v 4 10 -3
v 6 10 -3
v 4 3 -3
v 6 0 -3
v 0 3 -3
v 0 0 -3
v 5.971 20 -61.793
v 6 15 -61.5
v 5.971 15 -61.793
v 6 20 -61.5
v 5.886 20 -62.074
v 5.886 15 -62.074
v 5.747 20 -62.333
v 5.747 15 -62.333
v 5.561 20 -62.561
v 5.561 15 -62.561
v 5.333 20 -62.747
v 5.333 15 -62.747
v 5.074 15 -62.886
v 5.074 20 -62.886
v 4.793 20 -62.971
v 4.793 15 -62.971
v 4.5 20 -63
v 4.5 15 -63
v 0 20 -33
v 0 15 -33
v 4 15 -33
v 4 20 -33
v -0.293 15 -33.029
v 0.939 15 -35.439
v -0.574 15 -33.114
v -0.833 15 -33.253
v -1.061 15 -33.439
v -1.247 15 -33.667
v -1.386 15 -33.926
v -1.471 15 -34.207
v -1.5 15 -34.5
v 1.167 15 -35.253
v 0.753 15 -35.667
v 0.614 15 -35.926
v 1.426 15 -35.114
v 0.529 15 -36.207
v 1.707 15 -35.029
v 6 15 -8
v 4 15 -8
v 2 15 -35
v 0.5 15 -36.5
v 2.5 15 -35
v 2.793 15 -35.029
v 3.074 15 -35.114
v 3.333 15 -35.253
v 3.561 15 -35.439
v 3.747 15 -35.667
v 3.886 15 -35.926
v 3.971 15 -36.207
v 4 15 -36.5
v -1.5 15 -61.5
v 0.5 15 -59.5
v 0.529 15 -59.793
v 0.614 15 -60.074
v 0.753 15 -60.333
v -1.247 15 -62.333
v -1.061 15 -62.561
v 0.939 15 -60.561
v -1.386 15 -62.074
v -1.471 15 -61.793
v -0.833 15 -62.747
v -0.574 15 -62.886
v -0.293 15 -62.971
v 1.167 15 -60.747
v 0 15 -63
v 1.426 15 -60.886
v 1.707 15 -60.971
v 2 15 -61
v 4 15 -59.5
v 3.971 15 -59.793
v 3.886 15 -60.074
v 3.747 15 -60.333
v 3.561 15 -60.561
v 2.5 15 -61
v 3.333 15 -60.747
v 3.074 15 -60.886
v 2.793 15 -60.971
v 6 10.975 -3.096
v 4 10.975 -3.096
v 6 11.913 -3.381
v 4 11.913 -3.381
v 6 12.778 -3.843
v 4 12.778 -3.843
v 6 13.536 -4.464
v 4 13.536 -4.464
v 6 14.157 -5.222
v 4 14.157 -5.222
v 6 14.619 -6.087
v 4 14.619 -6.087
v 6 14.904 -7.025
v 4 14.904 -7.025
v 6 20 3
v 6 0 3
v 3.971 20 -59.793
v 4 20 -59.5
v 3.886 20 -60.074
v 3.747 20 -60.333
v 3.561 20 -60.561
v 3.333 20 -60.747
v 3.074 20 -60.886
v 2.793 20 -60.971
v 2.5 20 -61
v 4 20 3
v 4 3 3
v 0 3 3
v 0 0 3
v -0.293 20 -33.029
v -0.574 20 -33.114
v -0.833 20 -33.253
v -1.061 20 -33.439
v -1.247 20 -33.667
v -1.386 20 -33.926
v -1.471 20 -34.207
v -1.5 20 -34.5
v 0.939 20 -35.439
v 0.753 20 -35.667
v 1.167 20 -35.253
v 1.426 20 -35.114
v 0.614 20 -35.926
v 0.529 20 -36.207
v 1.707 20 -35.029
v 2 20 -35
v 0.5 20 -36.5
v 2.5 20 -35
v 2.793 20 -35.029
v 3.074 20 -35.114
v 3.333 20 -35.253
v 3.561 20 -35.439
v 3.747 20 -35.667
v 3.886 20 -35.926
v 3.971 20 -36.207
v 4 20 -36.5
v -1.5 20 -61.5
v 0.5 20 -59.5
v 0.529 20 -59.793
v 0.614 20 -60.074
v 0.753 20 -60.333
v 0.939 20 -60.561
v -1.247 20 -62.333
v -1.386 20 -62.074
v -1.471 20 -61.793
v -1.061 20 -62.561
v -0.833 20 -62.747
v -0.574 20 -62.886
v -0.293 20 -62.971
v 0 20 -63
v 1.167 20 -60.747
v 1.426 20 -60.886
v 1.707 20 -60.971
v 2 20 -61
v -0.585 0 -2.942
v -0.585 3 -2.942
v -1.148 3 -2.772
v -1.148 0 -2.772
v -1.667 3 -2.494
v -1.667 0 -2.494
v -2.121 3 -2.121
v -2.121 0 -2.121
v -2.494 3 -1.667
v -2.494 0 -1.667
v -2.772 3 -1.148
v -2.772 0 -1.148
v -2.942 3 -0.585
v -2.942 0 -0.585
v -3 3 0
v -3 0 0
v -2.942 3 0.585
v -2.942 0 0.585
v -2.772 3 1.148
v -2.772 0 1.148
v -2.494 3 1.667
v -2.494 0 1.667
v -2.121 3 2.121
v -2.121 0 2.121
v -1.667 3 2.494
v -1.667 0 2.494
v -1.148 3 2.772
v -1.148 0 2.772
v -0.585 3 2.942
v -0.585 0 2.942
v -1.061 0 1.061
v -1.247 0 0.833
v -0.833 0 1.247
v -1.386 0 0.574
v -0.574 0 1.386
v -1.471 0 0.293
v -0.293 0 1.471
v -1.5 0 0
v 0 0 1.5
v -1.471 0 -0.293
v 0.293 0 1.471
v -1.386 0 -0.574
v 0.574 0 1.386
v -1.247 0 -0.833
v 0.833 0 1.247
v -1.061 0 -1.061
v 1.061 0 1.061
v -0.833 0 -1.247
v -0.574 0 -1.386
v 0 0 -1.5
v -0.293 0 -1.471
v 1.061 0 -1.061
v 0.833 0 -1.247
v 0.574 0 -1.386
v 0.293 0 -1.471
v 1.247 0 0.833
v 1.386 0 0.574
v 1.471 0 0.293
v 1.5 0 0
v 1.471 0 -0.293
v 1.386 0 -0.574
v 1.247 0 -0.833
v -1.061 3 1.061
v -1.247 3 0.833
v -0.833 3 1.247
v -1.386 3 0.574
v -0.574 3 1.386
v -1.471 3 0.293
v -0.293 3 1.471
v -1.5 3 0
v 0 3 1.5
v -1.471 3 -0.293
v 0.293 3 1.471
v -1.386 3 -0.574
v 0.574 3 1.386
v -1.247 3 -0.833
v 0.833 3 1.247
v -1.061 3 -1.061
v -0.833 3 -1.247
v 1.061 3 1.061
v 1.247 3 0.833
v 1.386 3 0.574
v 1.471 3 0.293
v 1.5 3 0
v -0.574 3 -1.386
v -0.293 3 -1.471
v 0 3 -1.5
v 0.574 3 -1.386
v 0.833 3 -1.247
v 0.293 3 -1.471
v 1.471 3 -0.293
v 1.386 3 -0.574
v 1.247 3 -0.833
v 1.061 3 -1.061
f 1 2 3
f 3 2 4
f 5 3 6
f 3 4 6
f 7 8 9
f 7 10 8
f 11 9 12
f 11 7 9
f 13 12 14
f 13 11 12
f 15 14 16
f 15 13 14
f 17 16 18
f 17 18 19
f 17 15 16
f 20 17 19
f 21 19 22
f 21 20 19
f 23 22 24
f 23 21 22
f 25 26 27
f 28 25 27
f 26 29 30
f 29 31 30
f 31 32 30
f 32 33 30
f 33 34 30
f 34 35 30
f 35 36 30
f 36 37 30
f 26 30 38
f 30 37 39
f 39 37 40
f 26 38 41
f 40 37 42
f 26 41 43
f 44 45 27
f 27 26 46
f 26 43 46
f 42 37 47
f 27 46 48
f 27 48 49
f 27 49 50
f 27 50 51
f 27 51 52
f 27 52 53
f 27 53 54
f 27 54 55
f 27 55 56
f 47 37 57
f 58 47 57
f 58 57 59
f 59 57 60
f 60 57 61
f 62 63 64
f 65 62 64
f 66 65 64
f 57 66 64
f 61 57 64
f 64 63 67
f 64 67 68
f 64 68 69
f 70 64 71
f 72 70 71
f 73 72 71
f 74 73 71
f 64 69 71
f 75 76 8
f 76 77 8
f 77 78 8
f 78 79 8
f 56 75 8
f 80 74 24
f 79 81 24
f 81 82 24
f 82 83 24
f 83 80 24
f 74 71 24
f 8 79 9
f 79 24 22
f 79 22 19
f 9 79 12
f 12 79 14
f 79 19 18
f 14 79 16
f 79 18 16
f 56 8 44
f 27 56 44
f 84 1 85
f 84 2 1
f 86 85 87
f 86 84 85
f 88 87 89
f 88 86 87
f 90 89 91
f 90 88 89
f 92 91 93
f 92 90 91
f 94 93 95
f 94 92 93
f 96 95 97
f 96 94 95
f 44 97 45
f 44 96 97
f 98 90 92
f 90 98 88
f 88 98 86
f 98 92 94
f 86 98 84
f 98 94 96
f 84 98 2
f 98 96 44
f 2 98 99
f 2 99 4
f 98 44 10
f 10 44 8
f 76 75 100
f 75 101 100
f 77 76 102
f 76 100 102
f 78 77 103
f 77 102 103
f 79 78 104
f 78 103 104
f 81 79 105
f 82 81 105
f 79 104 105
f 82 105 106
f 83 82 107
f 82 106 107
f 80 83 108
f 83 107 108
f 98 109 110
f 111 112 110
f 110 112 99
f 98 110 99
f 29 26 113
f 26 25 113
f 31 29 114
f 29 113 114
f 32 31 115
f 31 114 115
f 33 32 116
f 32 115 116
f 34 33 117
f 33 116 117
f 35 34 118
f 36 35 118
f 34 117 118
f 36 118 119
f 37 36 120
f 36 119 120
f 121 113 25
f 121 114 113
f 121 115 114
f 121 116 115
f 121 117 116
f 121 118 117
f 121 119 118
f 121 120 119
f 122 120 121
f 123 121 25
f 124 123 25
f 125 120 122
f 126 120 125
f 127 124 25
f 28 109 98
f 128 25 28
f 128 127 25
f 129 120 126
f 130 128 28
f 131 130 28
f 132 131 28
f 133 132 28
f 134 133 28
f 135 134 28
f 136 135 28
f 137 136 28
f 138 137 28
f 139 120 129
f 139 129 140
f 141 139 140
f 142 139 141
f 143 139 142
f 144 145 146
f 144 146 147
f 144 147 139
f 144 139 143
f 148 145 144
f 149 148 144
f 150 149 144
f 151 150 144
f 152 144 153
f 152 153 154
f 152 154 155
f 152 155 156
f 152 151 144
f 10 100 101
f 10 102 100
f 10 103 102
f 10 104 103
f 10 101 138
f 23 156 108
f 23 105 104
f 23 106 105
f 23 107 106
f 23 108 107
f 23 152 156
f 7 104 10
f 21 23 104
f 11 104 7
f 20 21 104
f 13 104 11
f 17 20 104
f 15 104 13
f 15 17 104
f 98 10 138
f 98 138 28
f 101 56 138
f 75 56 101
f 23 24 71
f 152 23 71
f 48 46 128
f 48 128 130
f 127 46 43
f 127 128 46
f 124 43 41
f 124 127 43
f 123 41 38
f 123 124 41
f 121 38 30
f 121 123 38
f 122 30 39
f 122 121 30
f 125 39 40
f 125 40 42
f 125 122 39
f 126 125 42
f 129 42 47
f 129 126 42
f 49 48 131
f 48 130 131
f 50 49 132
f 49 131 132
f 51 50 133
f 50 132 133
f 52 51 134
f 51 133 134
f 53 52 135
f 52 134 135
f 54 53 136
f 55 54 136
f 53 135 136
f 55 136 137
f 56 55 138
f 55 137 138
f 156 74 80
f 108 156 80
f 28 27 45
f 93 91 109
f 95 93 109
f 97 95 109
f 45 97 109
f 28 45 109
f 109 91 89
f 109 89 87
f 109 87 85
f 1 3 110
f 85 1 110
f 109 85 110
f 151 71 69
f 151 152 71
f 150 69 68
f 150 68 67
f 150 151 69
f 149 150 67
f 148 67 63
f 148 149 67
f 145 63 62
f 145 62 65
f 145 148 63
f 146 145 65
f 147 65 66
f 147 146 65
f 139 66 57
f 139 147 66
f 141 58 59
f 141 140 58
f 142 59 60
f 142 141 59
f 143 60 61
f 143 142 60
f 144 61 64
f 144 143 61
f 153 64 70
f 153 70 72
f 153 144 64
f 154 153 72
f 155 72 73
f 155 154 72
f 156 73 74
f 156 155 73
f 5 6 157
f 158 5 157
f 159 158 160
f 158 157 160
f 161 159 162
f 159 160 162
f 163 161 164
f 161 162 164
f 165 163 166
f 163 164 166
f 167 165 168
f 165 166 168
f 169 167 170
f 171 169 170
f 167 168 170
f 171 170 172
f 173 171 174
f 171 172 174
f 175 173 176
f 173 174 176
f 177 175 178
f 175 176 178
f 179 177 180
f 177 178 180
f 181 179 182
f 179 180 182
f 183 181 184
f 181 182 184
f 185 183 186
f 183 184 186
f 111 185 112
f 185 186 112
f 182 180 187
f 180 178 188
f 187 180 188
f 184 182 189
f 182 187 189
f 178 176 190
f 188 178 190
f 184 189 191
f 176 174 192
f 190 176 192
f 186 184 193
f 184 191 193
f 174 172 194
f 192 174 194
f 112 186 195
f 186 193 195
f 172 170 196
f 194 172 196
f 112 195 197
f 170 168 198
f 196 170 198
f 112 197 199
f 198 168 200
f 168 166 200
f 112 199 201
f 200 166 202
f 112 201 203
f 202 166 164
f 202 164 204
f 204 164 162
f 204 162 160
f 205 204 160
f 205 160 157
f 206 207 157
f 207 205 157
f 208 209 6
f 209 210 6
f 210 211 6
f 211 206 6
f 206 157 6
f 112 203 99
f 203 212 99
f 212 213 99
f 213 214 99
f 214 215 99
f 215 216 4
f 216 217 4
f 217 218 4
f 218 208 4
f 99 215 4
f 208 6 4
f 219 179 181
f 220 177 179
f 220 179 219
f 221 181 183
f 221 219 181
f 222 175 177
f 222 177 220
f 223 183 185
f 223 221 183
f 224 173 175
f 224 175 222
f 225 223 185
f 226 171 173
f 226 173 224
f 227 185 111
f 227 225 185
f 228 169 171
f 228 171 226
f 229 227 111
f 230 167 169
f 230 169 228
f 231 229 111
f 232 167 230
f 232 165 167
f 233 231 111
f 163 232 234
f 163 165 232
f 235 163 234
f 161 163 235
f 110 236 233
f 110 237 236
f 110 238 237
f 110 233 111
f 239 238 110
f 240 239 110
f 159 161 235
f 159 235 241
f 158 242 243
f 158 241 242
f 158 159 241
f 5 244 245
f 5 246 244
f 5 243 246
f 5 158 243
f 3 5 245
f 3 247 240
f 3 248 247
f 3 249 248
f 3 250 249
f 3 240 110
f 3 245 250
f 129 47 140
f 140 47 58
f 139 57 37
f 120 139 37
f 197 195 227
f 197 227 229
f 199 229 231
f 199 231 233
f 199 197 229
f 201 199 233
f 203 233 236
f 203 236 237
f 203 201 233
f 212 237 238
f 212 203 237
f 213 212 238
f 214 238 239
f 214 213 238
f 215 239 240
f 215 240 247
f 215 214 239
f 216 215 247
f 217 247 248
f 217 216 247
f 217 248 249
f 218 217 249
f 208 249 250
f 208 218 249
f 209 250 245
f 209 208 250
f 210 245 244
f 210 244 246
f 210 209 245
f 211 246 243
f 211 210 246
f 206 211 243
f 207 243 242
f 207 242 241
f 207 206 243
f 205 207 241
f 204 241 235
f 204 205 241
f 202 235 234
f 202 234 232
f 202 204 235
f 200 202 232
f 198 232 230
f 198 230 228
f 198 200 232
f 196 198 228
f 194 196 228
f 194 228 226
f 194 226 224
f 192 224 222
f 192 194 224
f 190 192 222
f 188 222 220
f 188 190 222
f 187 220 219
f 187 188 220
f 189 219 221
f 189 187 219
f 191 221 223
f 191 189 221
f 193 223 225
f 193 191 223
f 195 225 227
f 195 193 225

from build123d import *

# Parameters (mm, degrees)
SKETCH_1_R      = 3
SKETCH_1_R_2    = 1.5
EXTRUDE_1_DEPTH = 3
SKETCH_2_W      = 2
SKETCH_2_H      = 6
EXTRUDE_2_DEPTH = 15
SKETCH_3_W      = 3.5
SKETCH_3_H      = 26
EXTRUDE_3_DEPTH = 5
FILLET_1_R      = 5
FILLET_2_R      = 1.5
FILLET_3_R      = 1.5


with BuildPart() as part:
    # 草图1 → 凸台-拉伸1 (new body)
    # profile 1 of 2: a face of its own
    with BuildSketch(Plane(origin=(0, 0, 0), x_dir=(1, 0, 0), z_dir=(0, 1, 0))):
        Circle(SKETCH_1_R)
        with Locations(Location((0, 0, 0), (0, 0, 270))):
            Circle(SKETCH_1_R_2, mode=Mode.SUBTRACT)
    # profile 2 of 2: a face of its own
    with BuildSketch(Plane(origin=(0, 0, 0), x_dir=(1, 0, 0), z_dir=(0, 1, 0))):
        with BuildLine():
            Line((6, 3), (0, 3))
            ThreePointArc((0, 3), (2.121320344, 2.121320344), (3, 0))
            ThreePointArc((3, 0), (2.121320344, -2.121320344), (0, -3))
            Line((0, -3), (6, -3))
            Line((6, -3), (6, 3))
        make_face()
    extrude(amount=EXTRUDE_1_DEPTH)

    # 草图2 → 凸台-拉伸2 (add)
    with BuildSketch(Plane(origin=(0, 0, 0), x_dir=(1, 0, 0), z_dir=(0, 1, 0))):
        with Locations((5, 0)):
            Rectangle(SKETCH_2_W, SKETCH_2_H)
    extrude(amount=EXTRUDE_2_DEPTH)

    # 草图3 → 凸台-拉伸3 (add)
    with BuildSketch(Plane(origin=(0, 15, 0), x_dir=(1, 0, 0), z_dir=(0, 1, 0))):
        Polygon((6, -3), (6, 63), (4, 63), (-1.5, 63), (-1.5, 33), (4, 33), (4, -3), align=None)
        with Locations((2.25, 48)):
            Rectangle(SKETCH_3_W, SKETCH_3_H, mode=Mode.SUBTRACT)
    extrude(amount=EXTRUDE_3_DEPTH)

    # 圆角1
    fillet_1_edges = [part.edges().sort_by_distance(p)[0] for p in [
        (5, 15, -3),
    ]]
    fillet(fillet_1_edges, radius=FILLET_1_R)

    # 圆角2
    fillet_2_edges = [part.edges().sort_by_distance(p)[0] for p in [
        (6, 17.5, -63),
        (-1.5, 17.5, -63),
        (-1.5, 17.5, -33),
        (0.5, 17.5, -35),
        (4, 17.5, -35),
    ]]
    fillet(fillet_2_edges, radius=FILLET_2_R)

    # 圆角3
    fillet_3_edges = [part.edges().sort_by_distance(p)[0] for p in [
        (4, 17.5, -61),
        (0.5, 17.5, -61),
    ]]
    fillet(fillet_3_edges, radius=FILLET_3_R)


solid = part.part
